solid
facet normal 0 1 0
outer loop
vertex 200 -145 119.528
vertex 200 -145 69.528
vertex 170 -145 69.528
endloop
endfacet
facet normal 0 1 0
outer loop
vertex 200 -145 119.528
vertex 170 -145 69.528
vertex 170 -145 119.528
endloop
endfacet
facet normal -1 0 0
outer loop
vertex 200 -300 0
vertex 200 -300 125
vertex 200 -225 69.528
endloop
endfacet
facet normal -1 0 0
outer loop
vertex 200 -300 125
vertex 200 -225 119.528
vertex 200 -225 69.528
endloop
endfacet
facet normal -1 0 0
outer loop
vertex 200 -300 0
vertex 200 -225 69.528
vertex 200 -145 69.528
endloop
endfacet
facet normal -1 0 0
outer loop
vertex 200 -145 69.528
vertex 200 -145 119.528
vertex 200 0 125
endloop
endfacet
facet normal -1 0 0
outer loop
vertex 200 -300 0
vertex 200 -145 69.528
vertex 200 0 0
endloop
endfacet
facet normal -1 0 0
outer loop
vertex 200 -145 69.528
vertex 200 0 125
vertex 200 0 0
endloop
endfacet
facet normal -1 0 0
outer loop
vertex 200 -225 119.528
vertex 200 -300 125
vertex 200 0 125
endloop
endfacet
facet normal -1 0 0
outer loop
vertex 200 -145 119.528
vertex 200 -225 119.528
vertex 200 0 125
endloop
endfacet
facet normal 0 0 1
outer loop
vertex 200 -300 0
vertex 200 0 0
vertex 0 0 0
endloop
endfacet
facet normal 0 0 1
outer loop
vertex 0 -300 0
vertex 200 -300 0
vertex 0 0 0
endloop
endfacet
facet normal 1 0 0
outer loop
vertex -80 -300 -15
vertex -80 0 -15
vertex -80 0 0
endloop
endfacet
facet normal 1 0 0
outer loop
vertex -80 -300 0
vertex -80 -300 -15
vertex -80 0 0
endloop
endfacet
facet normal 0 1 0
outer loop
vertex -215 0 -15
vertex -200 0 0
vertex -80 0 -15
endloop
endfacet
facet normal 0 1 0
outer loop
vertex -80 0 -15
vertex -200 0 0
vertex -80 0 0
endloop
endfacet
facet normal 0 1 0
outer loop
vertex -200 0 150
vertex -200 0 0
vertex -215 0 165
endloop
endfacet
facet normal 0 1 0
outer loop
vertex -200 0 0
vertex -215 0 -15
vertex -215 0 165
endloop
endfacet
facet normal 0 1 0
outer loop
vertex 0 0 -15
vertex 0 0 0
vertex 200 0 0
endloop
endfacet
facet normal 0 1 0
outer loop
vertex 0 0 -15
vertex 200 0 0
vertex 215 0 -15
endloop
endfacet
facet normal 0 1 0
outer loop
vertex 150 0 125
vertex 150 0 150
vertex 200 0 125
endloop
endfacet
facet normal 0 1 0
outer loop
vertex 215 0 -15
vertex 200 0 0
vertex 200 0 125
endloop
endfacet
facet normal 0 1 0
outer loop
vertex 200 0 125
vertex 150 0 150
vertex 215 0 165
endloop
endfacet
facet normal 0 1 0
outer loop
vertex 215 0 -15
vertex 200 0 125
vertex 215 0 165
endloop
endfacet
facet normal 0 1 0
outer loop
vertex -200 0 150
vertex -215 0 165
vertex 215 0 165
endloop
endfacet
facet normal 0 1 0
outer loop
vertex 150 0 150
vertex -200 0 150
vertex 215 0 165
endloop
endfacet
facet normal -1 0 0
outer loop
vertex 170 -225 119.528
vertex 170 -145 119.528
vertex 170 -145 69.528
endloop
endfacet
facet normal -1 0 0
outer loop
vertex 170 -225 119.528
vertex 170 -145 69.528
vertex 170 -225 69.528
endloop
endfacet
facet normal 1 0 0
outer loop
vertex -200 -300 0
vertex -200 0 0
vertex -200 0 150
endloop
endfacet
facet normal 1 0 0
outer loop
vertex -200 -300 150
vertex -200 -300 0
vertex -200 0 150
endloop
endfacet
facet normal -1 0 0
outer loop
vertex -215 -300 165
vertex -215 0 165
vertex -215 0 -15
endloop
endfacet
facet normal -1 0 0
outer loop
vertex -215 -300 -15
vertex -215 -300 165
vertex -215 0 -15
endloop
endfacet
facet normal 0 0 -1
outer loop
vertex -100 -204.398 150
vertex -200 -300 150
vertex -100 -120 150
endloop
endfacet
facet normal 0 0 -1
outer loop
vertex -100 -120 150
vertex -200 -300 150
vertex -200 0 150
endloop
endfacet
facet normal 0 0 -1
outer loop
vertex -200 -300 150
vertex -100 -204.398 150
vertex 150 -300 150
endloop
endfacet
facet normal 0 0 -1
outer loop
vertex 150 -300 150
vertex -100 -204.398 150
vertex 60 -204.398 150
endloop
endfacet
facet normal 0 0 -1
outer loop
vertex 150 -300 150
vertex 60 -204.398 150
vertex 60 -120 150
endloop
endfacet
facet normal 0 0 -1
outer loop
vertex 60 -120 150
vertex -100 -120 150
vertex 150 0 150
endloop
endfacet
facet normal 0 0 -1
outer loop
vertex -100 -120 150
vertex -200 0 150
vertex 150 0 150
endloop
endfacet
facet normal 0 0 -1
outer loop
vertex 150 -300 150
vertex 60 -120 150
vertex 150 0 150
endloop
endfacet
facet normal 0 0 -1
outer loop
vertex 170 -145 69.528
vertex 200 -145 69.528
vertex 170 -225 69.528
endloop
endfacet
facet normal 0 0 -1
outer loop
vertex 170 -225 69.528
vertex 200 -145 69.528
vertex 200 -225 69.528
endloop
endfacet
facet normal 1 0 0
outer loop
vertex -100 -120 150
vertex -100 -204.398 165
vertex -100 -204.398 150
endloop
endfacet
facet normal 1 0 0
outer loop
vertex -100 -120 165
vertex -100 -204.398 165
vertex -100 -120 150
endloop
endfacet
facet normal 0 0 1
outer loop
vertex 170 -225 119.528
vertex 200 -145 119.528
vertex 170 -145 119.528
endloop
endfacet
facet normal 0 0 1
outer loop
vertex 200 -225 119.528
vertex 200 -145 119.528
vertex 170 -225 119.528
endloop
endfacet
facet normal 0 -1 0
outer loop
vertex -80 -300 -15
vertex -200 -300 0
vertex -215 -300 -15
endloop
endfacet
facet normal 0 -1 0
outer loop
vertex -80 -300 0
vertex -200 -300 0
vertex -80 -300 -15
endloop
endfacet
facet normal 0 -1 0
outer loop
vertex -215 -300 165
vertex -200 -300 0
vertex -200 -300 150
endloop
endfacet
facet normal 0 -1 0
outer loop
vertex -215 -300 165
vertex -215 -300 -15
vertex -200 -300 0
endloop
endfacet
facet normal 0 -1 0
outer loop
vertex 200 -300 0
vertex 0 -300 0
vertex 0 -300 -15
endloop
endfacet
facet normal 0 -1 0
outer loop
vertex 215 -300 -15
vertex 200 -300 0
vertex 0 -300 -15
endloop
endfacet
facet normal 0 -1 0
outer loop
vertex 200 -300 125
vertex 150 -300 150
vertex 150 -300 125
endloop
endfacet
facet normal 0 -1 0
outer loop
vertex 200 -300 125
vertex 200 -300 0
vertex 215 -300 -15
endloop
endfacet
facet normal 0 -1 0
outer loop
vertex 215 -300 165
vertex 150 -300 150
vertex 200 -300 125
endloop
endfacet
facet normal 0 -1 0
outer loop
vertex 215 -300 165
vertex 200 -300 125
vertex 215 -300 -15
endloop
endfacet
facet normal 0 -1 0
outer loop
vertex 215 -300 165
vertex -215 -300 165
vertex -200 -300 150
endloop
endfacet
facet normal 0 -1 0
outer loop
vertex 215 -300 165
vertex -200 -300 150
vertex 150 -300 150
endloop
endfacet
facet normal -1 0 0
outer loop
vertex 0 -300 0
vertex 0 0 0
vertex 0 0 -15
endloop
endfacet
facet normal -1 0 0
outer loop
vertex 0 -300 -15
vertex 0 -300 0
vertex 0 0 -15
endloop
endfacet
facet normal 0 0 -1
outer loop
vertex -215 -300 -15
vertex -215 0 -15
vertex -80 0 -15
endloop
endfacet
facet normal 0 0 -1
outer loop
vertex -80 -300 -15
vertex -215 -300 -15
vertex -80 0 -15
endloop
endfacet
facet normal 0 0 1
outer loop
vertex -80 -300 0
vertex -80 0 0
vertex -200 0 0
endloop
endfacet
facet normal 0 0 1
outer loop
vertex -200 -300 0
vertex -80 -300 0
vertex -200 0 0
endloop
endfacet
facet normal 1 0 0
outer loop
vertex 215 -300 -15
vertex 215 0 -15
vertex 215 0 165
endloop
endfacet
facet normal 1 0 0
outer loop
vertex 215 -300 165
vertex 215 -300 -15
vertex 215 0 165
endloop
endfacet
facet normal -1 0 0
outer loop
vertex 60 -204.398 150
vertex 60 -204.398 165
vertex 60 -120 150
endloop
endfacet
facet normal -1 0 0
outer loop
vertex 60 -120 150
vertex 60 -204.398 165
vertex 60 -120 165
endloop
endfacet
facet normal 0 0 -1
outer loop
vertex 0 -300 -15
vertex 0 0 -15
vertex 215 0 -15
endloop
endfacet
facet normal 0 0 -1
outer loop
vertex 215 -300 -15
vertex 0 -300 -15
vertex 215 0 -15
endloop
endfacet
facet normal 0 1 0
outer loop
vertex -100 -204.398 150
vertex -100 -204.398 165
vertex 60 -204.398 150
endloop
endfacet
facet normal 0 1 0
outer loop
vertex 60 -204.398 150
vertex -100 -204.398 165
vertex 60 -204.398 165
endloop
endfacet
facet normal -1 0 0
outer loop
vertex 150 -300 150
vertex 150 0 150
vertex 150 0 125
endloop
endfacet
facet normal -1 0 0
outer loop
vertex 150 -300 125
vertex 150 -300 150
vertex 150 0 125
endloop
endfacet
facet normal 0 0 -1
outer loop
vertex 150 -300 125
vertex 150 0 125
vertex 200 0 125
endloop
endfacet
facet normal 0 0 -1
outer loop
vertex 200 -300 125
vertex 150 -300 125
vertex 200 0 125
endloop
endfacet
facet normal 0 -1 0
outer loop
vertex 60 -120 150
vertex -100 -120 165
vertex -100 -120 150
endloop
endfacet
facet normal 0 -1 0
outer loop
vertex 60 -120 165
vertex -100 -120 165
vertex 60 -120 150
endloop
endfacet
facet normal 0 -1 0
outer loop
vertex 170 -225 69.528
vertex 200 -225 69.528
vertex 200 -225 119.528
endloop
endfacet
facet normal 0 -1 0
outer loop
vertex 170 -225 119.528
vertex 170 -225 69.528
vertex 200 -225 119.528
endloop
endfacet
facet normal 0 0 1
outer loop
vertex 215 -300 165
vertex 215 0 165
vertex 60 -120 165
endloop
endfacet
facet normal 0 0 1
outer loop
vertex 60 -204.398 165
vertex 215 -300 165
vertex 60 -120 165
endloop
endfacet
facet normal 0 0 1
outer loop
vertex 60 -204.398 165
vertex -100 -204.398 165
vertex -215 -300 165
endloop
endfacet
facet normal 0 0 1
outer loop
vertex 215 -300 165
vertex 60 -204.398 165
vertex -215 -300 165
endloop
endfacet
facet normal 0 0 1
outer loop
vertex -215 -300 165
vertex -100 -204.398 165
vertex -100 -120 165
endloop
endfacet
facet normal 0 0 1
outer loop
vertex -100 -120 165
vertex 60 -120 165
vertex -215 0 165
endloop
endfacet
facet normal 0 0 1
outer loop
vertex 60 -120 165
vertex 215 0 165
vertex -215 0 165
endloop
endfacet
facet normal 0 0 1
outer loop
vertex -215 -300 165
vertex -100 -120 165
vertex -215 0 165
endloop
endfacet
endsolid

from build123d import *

# Parameters (mm, degrees)
F1_DEPTH = 300
F2_W     = 160
F2_H     = 84.39811
F3_DEPTH = 25
F4_W     = 80
F4_H     = 50
F5_DEPTH = 30


with BuildPart() as f1:
    # F0 (on Front) → F1 (new body)
    with BuildSketch(Plane.XZ):
        Polygon((-80, -15), (-80, 0), (-200, 0), (-200, 150), (150, 150), (150, 125), (200, 125), (200, 0), (0, 0), (0, -15), (215, -15), (215, 165), (-215, 165), (-215, -15), align=None)
    extrude(amount=F1_DEPTH)

    # F2 (on face) → F3 (cut)
    with BuildSketch(Plane.XY.offset(165)):
        with Locations((-20, -162.199055)):
            Rectangle(F2_W, F2_H)
    extrude(amount=-F3_DEPTH, mode=Mode.SUBTRACT)

    # F4 (on face) → F5 (join)
    with BuildSketch(Plane(origin=(200, 0, 0), x_dir=(0, -1, 0), z_dir=(-1, 0, 0))):
        with Locations((185, 94.528437)):
            Rectangle(F4_W, F4_H)
    extrude(amount=F5_DEPTH)


solid = f1.part
